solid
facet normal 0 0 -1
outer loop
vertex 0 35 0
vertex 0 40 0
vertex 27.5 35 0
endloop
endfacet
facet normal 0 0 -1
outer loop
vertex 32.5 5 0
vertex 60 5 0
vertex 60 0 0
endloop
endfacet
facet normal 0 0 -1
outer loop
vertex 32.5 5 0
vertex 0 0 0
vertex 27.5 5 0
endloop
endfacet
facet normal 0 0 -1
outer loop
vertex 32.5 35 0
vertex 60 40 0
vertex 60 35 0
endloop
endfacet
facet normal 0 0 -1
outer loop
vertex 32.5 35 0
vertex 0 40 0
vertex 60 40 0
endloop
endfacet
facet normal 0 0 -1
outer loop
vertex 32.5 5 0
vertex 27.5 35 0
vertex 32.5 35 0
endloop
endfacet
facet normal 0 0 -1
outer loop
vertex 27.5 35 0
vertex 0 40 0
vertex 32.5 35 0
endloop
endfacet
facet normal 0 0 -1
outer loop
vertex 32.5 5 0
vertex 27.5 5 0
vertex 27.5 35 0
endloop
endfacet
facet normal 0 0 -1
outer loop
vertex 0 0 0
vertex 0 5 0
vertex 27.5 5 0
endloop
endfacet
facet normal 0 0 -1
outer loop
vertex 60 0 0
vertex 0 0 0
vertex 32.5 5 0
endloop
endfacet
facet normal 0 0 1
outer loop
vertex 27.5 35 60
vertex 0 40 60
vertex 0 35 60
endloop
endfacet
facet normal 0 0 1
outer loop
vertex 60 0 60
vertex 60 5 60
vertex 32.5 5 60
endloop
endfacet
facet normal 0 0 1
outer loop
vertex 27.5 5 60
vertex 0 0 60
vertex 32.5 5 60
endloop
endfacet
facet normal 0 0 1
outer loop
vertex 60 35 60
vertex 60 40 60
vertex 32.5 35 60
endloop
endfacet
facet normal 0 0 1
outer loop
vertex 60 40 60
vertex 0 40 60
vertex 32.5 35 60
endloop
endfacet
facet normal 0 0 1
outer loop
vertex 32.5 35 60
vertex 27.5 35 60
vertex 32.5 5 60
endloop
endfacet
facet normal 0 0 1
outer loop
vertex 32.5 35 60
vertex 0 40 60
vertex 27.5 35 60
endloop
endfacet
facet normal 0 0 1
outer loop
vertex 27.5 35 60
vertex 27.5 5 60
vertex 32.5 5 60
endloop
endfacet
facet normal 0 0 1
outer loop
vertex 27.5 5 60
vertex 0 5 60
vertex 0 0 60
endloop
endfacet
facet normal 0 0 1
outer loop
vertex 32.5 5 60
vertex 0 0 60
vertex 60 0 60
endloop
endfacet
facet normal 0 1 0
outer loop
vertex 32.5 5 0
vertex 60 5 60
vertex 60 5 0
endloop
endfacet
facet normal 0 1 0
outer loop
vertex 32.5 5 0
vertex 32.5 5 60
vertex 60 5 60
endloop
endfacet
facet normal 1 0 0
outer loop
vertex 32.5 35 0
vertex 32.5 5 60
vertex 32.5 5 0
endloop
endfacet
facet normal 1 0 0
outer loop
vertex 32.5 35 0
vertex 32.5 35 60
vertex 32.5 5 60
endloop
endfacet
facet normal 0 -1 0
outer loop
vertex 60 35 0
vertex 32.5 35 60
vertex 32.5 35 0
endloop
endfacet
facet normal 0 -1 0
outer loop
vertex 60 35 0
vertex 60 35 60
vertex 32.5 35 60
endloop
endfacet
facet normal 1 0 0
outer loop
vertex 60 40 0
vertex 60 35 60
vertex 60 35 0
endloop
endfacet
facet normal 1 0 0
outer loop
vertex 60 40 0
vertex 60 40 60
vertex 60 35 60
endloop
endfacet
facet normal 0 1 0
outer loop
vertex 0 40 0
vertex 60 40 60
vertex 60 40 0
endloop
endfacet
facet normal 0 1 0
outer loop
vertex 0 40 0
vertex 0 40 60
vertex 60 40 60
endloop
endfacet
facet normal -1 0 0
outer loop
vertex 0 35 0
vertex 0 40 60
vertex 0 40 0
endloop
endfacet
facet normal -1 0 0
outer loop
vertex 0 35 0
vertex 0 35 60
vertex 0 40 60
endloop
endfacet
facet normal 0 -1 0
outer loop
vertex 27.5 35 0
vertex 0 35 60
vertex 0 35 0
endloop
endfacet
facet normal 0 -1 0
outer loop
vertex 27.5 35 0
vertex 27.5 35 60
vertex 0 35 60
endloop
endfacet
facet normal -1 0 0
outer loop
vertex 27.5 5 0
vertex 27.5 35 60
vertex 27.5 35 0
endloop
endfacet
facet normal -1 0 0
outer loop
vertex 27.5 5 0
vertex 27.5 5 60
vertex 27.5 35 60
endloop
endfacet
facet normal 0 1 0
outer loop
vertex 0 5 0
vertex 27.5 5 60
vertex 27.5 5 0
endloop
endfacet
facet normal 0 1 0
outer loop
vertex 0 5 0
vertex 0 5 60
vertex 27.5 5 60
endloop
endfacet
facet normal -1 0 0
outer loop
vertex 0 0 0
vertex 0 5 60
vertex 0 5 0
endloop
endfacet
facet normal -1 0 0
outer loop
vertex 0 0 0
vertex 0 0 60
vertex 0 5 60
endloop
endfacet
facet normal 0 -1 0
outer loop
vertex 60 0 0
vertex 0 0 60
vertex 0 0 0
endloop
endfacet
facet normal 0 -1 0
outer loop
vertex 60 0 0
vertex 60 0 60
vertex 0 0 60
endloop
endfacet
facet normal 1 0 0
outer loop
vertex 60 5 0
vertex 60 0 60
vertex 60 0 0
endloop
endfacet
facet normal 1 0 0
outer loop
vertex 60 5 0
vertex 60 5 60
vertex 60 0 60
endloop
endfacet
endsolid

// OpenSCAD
$fn = 32;

// ----------------------------------------------------------------------
// Structural section: ibeam 60 x 40 mm
// ----------------------------------------------------------------------

// --- parameters (mm) ---
sec_w = 60;               // section width, X
sec_h = 40;               // section height, Y
flange_t = 5;             // flange thickness
web_t = 5;                // web thickness
plate_t = 60;             // cut length, Z (extrusion height)

profile = [[0, 0], [60, 0], [60, 5], [32.5, 5], [32.5, 35], [60, 35], [60, 40], [0, 40], [0, 35], [27.5, 35], [27.5, 5], [0, 5]];  // primary outline, 12 points, counter clockwise

// --- the one profile operation ---
linear_extrude(height = plate_t) polygon(points = profile);
